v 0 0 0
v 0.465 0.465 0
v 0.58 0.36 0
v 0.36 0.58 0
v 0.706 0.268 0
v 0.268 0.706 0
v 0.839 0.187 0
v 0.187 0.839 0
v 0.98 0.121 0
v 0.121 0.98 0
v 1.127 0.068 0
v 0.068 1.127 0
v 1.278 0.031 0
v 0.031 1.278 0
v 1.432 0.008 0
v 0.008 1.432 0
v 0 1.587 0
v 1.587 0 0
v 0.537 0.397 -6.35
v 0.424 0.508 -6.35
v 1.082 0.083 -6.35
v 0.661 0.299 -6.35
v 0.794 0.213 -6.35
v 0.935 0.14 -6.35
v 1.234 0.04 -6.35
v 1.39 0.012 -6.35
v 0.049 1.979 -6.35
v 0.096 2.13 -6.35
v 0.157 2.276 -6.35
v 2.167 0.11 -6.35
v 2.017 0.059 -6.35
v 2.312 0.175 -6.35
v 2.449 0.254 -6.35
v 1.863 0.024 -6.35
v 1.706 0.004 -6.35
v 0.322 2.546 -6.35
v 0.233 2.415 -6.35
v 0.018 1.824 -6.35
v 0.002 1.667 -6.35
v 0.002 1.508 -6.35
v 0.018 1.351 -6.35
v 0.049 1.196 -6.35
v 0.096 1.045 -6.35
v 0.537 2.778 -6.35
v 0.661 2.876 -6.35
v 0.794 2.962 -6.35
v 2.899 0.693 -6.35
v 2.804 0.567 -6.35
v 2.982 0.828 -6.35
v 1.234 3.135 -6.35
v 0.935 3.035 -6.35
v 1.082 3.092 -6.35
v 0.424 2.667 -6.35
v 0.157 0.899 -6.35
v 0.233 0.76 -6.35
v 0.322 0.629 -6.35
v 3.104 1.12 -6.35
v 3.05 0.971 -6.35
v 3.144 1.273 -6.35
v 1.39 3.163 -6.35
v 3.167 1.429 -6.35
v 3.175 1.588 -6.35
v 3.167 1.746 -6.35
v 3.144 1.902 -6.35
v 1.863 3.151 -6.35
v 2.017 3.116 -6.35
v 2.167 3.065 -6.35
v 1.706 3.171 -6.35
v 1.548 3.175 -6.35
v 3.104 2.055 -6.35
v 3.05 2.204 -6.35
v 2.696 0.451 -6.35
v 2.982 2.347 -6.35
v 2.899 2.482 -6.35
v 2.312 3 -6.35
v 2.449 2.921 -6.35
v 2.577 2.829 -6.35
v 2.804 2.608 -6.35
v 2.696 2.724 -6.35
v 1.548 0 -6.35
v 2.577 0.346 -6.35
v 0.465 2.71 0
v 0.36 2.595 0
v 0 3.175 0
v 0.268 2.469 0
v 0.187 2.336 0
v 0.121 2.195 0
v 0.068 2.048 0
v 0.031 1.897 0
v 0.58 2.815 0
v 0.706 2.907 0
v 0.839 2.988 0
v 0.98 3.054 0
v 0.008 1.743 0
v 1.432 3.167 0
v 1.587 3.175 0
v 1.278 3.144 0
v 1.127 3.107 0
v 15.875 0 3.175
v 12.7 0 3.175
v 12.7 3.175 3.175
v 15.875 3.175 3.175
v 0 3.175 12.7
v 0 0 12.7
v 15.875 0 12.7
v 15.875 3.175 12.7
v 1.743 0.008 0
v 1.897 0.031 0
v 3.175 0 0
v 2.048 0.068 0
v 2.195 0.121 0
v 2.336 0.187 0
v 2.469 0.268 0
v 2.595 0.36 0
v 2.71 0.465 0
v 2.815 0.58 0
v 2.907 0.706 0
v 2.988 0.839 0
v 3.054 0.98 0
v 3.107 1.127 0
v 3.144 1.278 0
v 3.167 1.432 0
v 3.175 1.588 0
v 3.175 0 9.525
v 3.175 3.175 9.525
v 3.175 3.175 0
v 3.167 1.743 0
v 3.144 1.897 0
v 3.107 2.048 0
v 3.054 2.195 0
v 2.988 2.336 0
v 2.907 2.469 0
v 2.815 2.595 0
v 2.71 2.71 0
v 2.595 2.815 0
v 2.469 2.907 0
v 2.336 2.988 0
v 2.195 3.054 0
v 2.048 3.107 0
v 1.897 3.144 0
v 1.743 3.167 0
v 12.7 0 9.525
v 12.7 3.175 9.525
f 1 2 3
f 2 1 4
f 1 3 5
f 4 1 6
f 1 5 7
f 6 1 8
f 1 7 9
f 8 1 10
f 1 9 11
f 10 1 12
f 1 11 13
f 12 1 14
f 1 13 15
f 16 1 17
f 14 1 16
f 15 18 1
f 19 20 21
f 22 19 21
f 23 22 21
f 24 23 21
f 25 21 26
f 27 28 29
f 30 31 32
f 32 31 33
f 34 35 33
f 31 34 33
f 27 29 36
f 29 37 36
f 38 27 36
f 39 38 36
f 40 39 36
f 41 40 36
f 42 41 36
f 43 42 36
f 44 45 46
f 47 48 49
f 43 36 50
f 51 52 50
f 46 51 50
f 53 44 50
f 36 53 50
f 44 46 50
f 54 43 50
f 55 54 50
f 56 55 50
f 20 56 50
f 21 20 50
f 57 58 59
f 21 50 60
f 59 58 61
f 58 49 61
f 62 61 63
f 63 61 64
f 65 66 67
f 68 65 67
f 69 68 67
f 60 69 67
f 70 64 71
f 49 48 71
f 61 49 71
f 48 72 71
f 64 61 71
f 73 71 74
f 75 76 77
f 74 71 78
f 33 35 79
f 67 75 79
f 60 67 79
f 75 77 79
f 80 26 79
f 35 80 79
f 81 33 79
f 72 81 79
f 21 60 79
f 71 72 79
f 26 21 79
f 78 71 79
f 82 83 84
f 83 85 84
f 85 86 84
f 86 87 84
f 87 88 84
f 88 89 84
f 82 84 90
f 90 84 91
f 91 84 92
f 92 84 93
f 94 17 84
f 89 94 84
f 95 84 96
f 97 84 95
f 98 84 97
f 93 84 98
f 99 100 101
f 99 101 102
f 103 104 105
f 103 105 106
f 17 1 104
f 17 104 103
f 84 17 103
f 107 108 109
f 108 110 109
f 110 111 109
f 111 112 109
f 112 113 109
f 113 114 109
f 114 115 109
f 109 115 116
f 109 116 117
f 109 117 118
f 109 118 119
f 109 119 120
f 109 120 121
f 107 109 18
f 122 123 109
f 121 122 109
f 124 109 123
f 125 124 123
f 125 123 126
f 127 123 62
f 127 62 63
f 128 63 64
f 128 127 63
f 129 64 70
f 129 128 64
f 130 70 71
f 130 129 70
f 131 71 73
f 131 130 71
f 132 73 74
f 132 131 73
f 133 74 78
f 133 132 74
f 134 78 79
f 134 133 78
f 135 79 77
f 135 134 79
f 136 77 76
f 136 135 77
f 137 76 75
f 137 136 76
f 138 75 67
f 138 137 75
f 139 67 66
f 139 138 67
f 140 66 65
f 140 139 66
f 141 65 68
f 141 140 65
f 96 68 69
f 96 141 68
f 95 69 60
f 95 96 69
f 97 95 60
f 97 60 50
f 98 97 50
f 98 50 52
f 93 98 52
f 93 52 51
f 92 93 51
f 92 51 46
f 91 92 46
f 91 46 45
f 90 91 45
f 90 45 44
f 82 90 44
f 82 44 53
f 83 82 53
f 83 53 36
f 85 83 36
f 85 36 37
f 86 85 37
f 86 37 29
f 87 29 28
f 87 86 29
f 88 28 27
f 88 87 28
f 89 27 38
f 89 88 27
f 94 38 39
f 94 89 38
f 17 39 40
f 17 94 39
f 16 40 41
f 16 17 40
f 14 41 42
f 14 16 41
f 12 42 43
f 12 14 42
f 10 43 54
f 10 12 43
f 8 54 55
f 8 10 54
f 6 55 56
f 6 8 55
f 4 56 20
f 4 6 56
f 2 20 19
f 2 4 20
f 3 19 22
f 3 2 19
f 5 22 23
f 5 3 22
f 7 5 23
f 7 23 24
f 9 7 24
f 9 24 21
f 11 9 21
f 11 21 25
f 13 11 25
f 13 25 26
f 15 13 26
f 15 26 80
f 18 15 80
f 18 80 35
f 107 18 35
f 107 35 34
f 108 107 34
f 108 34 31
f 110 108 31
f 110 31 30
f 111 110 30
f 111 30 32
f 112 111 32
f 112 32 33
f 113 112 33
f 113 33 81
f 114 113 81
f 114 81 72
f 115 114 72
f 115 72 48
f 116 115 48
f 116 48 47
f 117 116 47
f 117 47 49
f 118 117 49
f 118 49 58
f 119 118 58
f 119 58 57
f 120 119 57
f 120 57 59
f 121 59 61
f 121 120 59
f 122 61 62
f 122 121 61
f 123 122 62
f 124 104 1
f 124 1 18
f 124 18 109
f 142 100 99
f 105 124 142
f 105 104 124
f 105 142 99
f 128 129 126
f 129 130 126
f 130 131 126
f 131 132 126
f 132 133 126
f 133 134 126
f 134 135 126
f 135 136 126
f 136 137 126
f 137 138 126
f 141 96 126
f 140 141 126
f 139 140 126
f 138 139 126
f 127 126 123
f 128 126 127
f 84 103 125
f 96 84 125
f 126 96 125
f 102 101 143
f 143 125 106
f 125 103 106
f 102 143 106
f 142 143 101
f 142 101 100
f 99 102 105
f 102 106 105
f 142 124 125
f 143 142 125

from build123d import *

# Parameters (mm, degrees)
F0_W     = 3.175
F0_H     = 3.175
F1_DEPTH = 12.7
F2_W     = 3.175
F2_H     = 3.175
F3_DEPTH = 12.7
F4_W     = 3.175
F4_H     = 3.175
F5_DEPTH = 6.35
F6_R     = 1.5875
F7_DEPTH = 6.35


with BuildPart() as f1:
    # F0 (on Top) → F1 (new body)
    with BuildSketch(Plane.XY):
        with Locations((1.5875, 1.5875)):
            Rectangle(F0_W, F0_H)
    extrude(amount=F1_DEPTH)

    # F2 (on face) → F3 (join)
    with BuildSketch(Plane.YZ.offset(3.175)):
        with Locations((1.5875, 11.1125)):
            Rectangle(F2_W, F2_H)
    extrude(amount=F3_DEPTH)

    # F4 (on face) → F5 (join)
    with BuildSketch(Plane(origin=(0, 0, 9.525), x_dir=(1, 0, 0), z_dir=(0, 0, -1))):
        with Locations((14.2875, -1.5875)):
            Rectangle(F4_W, F4_H)
    extrude(amount=F5_DEPTH)

    # F6 (on Top) → F7 (join)
    with BuildSketch(Plane.XY):
        with Locations((1.5875, 1.5875)):
            Circle(F6_R)
    extrude(amount=-F7_DEPTH)


solid = f1.part
